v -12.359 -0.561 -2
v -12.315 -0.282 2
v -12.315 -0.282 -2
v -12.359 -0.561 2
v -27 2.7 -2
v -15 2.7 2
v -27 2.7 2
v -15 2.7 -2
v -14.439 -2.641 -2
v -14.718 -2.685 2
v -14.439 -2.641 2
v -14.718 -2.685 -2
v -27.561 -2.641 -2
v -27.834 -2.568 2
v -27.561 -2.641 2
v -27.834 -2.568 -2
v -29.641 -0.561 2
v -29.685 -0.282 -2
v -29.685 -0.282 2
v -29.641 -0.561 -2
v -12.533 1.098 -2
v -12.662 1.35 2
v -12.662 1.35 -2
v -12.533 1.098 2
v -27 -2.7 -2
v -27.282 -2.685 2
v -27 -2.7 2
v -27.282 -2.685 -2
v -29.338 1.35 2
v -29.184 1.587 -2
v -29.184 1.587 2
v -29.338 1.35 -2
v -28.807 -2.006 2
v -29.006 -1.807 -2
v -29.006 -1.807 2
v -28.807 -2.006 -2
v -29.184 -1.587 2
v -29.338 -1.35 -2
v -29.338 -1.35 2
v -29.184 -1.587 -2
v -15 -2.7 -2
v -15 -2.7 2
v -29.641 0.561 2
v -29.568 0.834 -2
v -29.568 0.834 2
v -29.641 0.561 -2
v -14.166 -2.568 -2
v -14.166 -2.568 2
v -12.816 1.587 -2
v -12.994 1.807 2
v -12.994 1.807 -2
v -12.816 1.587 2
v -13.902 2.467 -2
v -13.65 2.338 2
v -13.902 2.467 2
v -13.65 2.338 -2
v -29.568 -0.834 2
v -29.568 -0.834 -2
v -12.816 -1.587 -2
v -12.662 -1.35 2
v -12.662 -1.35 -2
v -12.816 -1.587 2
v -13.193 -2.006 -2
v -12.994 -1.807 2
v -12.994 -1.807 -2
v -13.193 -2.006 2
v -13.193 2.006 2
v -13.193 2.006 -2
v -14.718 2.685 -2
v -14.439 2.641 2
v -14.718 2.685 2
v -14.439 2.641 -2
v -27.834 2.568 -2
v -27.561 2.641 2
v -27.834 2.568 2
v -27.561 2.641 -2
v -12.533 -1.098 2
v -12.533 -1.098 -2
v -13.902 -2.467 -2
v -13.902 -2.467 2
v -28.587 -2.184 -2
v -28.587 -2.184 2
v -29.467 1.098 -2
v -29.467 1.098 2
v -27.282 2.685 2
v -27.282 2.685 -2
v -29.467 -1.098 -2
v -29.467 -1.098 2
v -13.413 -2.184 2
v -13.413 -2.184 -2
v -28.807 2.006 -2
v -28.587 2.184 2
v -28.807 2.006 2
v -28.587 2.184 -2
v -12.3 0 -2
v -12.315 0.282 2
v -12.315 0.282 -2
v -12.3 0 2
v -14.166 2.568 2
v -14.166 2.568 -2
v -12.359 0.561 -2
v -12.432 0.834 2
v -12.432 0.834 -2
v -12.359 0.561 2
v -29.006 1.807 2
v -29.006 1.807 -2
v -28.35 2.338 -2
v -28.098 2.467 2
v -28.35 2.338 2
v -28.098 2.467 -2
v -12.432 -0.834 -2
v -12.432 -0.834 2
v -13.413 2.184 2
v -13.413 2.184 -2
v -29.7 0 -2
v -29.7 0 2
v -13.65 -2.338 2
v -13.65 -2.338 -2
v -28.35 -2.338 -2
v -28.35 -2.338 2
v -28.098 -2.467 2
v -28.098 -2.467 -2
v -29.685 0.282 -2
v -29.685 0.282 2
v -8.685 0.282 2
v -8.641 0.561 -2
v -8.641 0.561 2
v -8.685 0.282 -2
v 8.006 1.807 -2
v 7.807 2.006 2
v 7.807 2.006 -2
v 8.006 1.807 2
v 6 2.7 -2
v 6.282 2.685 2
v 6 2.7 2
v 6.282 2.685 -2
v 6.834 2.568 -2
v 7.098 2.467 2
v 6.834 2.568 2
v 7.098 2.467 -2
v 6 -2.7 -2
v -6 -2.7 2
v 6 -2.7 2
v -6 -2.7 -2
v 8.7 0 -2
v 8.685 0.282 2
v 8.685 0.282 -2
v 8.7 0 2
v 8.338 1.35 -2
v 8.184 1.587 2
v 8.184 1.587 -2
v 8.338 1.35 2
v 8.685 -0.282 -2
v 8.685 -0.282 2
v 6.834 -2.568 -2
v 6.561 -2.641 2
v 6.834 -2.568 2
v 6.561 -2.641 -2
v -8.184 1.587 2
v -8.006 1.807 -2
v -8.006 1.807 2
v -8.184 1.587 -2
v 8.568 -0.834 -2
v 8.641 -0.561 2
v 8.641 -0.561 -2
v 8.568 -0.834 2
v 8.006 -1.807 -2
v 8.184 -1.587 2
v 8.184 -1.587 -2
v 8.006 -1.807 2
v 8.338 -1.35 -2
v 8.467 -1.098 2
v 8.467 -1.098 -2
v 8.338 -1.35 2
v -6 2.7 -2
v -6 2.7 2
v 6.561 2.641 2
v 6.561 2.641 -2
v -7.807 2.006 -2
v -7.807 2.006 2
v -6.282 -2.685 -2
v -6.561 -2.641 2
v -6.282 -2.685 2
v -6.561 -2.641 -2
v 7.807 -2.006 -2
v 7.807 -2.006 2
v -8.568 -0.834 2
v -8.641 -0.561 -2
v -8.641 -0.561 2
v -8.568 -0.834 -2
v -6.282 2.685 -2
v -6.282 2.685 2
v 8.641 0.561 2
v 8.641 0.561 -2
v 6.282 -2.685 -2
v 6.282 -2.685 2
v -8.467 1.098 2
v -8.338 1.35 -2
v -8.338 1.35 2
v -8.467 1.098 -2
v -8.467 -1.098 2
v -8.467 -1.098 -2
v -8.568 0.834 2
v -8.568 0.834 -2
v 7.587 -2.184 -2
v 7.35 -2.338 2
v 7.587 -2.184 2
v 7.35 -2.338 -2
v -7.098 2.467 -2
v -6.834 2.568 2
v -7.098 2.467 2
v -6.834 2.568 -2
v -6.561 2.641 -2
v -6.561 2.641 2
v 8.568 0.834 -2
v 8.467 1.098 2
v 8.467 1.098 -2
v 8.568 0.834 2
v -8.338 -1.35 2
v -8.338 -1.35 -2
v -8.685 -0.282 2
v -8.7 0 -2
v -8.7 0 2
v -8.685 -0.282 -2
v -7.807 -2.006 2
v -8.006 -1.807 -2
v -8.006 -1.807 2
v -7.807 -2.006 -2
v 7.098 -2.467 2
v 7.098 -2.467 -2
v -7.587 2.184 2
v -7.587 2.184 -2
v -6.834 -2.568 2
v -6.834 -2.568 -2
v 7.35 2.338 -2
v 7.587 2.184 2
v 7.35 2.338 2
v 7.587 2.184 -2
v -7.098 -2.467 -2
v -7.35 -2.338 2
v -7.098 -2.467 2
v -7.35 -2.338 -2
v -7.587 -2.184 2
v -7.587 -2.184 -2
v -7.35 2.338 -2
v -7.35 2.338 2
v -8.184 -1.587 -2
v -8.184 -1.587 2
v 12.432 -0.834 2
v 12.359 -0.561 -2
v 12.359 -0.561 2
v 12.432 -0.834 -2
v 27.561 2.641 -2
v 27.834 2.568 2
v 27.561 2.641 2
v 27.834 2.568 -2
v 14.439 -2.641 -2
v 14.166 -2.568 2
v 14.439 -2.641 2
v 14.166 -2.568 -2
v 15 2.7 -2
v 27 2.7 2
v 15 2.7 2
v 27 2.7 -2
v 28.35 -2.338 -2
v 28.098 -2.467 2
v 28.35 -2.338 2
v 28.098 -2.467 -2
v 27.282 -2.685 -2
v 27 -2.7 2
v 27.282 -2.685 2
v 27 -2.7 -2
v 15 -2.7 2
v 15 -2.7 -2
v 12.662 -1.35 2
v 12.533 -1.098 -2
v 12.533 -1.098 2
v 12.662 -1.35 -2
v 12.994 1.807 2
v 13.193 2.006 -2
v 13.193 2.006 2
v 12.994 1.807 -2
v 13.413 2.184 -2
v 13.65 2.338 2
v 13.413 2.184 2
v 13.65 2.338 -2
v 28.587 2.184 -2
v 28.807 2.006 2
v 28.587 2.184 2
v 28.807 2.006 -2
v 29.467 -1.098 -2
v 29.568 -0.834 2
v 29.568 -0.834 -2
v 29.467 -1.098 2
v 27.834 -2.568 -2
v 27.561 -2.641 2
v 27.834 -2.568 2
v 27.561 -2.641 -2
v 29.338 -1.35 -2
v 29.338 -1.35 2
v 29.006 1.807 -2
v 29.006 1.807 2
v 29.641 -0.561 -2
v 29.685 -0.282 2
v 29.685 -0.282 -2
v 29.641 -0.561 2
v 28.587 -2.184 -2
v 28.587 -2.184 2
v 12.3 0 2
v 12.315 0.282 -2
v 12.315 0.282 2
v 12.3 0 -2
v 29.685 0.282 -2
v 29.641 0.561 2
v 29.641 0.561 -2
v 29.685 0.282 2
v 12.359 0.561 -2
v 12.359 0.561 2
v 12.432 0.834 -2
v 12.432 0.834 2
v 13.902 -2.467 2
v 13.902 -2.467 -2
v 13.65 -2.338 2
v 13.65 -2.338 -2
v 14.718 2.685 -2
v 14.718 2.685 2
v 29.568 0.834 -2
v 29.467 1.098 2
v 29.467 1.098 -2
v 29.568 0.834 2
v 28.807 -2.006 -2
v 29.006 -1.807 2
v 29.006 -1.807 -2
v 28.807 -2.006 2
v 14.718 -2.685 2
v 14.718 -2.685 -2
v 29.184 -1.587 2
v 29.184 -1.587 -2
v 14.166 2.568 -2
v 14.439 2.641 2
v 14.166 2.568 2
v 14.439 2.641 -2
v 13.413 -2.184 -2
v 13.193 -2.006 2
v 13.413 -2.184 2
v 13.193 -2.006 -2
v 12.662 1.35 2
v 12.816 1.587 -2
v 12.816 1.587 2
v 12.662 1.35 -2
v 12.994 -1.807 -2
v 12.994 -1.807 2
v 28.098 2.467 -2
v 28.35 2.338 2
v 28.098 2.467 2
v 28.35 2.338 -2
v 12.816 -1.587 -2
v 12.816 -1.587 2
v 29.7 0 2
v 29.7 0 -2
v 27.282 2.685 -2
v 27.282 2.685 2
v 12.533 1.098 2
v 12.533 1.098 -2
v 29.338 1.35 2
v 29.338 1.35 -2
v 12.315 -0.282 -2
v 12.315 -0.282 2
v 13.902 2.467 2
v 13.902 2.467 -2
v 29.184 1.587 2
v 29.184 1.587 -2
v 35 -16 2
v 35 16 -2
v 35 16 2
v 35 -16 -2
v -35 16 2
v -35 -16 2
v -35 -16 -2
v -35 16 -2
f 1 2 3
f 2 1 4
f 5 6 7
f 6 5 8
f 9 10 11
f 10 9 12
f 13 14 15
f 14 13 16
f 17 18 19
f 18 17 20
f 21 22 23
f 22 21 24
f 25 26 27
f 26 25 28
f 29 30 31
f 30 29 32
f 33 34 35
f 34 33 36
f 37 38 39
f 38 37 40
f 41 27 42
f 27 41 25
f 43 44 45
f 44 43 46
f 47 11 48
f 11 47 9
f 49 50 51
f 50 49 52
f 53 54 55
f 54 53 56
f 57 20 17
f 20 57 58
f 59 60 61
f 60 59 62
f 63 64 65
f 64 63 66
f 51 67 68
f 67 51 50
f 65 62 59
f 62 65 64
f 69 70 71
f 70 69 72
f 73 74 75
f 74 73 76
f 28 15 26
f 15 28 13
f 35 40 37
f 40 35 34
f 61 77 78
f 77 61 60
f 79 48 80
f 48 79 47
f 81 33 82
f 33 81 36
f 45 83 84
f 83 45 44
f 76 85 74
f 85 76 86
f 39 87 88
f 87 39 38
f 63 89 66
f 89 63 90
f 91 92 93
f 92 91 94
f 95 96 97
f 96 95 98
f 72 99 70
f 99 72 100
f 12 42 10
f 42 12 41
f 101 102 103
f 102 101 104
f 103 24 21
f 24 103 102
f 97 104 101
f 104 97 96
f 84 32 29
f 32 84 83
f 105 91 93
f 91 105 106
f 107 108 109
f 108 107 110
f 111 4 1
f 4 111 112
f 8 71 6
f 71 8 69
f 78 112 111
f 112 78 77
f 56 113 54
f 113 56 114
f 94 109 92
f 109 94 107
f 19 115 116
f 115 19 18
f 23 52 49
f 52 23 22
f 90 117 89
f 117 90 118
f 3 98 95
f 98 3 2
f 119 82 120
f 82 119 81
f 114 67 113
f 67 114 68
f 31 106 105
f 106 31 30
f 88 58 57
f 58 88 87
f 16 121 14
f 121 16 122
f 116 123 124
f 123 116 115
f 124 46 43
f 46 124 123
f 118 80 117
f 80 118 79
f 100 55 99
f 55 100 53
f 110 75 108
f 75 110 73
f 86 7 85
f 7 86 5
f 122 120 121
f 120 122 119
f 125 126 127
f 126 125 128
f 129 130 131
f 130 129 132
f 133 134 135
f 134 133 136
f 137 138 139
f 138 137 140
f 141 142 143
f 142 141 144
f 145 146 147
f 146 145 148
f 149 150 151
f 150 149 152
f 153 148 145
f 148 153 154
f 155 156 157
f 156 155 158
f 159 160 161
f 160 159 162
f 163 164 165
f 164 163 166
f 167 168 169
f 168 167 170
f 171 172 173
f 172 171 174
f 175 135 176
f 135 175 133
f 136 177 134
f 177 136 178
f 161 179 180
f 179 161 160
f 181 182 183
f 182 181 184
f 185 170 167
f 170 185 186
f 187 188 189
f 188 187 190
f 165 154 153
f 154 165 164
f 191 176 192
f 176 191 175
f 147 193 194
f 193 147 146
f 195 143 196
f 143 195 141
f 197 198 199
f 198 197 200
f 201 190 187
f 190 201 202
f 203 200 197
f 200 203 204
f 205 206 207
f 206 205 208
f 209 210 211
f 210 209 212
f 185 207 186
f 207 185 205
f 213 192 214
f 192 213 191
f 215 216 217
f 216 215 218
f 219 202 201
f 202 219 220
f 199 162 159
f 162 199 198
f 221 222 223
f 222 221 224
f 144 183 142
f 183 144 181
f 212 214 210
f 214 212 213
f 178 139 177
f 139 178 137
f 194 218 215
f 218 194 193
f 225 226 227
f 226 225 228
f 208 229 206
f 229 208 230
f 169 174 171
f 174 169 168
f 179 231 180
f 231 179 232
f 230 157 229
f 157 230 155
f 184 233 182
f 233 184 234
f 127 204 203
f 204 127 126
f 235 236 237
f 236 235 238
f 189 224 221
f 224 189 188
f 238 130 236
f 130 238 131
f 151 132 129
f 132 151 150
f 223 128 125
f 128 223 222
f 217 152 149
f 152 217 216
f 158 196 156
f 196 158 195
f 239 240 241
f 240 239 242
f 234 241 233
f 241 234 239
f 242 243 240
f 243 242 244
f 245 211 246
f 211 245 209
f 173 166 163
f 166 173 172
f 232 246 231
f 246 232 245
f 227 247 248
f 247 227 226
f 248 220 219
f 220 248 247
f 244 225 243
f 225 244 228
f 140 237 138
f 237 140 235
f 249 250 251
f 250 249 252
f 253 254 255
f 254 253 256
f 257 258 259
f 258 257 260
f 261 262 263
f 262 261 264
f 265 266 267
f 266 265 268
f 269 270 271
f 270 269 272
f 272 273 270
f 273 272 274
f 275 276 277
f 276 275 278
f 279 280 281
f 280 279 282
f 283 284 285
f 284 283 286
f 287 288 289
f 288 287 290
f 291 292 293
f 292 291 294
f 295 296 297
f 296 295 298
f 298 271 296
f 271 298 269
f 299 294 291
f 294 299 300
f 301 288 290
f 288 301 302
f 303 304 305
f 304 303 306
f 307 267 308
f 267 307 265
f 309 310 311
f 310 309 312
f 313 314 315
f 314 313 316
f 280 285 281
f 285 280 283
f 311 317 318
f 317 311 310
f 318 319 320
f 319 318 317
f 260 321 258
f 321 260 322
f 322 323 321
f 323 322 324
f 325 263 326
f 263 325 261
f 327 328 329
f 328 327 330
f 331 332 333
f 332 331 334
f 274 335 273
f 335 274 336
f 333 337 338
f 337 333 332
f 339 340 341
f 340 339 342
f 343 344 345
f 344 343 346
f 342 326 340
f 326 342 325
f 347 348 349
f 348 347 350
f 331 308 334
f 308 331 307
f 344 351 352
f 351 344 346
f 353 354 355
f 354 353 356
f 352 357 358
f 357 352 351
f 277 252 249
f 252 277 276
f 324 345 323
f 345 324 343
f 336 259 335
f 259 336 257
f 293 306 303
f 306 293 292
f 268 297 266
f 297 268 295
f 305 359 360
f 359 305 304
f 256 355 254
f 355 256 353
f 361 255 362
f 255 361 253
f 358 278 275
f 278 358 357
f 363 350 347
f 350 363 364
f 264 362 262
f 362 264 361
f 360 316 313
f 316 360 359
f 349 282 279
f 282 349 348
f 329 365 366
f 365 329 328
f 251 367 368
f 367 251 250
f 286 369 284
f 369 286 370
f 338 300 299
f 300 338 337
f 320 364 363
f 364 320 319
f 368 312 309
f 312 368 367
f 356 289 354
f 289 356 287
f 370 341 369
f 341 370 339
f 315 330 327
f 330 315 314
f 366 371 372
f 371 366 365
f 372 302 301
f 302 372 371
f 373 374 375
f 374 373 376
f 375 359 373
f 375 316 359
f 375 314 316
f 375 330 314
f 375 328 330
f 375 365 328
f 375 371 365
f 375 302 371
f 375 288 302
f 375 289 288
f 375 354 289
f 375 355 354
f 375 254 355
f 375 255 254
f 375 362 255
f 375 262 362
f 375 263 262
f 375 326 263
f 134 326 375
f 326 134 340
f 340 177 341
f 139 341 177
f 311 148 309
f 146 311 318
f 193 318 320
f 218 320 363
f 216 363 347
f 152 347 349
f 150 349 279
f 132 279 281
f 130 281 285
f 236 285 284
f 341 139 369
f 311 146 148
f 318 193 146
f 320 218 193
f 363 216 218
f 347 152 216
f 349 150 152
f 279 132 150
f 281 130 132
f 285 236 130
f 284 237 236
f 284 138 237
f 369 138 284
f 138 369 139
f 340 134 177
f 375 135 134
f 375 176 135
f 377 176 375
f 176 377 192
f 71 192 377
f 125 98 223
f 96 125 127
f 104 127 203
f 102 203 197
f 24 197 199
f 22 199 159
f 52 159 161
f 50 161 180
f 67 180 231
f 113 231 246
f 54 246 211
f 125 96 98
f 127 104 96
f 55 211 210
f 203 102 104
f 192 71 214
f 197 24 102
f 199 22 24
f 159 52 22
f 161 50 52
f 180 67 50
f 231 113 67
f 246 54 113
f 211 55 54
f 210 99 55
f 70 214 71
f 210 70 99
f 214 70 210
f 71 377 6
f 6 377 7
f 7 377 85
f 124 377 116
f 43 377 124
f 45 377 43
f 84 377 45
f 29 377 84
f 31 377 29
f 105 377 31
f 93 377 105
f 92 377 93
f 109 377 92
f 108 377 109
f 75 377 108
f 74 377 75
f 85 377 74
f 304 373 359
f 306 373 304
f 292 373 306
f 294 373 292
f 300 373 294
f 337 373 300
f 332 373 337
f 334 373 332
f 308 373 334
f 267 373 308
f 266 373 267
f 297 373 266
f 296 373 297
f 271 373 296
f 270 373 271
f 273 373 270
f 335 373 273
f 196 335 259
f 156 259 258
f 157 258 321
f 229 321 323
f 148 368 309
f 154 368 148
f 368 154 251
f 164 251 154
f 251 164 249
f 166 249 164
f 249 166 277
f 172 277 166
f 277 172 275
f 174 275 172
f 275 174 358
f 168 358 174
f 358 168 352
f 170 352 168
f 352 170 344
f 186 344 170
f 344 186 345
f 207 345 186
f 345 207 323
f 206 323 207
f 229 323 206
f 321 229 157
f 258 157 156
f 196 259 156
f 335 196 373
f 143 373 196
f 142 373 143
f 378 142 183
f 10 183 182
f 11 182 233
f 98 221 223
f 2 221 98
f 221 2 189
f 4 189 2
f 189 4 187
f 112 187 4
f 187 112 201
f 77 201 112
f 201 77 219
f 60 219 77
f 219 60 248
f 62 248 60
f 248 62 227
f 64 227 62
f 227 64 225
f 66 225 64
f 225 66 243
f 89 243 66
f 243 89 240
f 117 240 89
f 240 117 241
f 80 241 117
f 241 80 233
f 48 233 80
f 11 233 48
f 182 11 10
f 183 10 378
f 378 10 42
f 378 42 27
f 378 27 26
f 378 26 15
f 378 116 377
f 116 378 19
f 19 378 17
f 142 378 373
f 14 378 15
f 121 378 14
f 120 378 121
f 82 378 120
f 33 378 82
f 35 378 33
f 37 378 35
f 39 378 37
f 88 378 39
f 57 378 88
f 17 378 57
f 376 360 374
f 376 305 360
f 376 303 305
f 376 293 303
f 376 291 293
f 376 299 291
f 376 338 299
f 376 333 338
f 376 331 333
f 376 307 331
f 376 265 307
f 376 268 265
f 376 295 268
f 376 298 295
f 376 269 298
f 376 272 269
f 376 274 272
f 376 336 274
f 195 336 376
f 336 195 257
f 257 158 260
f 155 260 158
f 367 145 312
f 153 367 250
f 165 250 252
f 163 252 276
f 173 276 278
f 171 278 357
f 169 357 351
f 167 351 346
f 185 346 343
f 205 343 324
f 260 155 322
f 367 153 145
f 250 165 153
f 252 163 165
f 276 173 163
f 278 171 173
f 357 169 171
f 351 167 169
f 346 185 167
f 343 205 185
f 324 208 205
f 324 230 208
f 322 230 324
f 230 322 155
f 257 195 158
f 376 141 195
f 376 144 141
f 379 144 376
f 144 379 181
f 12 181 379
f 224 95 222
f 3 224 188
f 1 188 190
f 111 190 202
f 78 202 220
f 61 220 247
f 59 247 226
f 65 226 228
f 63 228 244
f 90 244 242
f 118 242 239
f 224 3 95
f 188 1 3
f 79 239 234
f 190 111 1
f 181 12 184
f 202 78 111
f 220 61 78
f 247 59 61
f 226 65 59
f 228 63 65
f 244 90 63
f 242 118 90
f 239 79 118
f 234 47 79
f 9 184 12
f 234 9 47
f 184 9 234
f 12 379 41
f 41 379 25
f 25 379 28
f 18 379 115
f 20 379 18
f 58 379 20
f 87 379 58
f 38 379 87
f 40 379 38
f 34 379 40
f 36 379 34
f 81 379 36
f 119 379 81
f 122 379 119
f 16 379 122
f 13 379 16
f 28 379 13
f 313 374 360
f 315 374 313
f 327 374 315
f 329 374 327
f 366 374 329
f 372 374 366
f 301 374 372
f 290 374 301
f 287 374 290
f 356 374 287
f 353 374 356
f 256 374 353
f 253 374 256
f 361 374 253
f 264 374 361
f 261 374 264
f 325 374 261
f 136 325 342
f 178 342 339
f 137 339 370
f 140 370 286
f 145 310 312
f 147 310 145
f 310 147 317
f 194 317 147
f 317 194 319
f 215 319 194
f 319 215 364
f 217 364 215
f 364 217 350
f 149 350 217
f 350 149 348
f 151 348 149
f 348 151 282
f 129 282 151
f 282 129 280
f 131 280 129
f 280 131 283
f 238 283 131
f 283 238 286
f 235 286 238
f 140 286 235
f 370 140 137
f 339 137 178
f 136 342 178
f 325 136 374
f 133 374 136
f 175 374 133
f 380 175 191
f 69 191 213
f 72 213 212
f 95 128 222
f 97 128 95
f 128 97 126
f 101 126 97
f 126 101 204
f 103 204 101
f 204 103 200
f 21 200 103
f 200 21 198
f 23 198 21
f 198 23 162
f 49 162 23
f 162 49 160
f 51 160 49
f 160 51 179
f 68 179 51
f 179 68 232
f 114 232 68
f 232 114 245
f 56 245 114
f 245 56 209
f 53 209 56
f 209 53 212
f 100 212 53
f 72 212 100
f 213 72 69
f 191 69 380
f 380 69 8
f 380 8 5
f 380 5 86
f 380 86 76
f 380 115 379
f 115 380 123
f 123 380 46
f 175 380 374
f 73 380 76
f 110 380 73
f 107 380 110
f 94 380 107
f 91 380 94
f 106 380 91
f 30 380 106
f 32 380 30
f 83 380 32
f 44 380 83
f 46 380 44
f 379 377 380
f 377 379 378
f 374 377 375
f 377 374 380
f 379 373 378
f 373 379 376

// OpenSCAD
// Slotted mounting plate.
$fn = 60;
eps = 0.02;
plate_l = 70;
plate_w = 32;
plate_t = 4;
slot_l = 12;
module slot(x) { hull() { translate([x-slot_l/2,0,-plate_t/2-eps]) cylinder(d=5.4,h=plate_t+2*eps); translate([x+slot_l/2,0,-plate_t/2-eps]) cylinder(d=5.4,h=plate_t+2*eps); } }
difference() { cube([plate_l,plate_w,plate_t],center=true); for(i=[0:2]) slot(-plate_l/2+14+i*(plate_l-28)/max(1,2)); }
